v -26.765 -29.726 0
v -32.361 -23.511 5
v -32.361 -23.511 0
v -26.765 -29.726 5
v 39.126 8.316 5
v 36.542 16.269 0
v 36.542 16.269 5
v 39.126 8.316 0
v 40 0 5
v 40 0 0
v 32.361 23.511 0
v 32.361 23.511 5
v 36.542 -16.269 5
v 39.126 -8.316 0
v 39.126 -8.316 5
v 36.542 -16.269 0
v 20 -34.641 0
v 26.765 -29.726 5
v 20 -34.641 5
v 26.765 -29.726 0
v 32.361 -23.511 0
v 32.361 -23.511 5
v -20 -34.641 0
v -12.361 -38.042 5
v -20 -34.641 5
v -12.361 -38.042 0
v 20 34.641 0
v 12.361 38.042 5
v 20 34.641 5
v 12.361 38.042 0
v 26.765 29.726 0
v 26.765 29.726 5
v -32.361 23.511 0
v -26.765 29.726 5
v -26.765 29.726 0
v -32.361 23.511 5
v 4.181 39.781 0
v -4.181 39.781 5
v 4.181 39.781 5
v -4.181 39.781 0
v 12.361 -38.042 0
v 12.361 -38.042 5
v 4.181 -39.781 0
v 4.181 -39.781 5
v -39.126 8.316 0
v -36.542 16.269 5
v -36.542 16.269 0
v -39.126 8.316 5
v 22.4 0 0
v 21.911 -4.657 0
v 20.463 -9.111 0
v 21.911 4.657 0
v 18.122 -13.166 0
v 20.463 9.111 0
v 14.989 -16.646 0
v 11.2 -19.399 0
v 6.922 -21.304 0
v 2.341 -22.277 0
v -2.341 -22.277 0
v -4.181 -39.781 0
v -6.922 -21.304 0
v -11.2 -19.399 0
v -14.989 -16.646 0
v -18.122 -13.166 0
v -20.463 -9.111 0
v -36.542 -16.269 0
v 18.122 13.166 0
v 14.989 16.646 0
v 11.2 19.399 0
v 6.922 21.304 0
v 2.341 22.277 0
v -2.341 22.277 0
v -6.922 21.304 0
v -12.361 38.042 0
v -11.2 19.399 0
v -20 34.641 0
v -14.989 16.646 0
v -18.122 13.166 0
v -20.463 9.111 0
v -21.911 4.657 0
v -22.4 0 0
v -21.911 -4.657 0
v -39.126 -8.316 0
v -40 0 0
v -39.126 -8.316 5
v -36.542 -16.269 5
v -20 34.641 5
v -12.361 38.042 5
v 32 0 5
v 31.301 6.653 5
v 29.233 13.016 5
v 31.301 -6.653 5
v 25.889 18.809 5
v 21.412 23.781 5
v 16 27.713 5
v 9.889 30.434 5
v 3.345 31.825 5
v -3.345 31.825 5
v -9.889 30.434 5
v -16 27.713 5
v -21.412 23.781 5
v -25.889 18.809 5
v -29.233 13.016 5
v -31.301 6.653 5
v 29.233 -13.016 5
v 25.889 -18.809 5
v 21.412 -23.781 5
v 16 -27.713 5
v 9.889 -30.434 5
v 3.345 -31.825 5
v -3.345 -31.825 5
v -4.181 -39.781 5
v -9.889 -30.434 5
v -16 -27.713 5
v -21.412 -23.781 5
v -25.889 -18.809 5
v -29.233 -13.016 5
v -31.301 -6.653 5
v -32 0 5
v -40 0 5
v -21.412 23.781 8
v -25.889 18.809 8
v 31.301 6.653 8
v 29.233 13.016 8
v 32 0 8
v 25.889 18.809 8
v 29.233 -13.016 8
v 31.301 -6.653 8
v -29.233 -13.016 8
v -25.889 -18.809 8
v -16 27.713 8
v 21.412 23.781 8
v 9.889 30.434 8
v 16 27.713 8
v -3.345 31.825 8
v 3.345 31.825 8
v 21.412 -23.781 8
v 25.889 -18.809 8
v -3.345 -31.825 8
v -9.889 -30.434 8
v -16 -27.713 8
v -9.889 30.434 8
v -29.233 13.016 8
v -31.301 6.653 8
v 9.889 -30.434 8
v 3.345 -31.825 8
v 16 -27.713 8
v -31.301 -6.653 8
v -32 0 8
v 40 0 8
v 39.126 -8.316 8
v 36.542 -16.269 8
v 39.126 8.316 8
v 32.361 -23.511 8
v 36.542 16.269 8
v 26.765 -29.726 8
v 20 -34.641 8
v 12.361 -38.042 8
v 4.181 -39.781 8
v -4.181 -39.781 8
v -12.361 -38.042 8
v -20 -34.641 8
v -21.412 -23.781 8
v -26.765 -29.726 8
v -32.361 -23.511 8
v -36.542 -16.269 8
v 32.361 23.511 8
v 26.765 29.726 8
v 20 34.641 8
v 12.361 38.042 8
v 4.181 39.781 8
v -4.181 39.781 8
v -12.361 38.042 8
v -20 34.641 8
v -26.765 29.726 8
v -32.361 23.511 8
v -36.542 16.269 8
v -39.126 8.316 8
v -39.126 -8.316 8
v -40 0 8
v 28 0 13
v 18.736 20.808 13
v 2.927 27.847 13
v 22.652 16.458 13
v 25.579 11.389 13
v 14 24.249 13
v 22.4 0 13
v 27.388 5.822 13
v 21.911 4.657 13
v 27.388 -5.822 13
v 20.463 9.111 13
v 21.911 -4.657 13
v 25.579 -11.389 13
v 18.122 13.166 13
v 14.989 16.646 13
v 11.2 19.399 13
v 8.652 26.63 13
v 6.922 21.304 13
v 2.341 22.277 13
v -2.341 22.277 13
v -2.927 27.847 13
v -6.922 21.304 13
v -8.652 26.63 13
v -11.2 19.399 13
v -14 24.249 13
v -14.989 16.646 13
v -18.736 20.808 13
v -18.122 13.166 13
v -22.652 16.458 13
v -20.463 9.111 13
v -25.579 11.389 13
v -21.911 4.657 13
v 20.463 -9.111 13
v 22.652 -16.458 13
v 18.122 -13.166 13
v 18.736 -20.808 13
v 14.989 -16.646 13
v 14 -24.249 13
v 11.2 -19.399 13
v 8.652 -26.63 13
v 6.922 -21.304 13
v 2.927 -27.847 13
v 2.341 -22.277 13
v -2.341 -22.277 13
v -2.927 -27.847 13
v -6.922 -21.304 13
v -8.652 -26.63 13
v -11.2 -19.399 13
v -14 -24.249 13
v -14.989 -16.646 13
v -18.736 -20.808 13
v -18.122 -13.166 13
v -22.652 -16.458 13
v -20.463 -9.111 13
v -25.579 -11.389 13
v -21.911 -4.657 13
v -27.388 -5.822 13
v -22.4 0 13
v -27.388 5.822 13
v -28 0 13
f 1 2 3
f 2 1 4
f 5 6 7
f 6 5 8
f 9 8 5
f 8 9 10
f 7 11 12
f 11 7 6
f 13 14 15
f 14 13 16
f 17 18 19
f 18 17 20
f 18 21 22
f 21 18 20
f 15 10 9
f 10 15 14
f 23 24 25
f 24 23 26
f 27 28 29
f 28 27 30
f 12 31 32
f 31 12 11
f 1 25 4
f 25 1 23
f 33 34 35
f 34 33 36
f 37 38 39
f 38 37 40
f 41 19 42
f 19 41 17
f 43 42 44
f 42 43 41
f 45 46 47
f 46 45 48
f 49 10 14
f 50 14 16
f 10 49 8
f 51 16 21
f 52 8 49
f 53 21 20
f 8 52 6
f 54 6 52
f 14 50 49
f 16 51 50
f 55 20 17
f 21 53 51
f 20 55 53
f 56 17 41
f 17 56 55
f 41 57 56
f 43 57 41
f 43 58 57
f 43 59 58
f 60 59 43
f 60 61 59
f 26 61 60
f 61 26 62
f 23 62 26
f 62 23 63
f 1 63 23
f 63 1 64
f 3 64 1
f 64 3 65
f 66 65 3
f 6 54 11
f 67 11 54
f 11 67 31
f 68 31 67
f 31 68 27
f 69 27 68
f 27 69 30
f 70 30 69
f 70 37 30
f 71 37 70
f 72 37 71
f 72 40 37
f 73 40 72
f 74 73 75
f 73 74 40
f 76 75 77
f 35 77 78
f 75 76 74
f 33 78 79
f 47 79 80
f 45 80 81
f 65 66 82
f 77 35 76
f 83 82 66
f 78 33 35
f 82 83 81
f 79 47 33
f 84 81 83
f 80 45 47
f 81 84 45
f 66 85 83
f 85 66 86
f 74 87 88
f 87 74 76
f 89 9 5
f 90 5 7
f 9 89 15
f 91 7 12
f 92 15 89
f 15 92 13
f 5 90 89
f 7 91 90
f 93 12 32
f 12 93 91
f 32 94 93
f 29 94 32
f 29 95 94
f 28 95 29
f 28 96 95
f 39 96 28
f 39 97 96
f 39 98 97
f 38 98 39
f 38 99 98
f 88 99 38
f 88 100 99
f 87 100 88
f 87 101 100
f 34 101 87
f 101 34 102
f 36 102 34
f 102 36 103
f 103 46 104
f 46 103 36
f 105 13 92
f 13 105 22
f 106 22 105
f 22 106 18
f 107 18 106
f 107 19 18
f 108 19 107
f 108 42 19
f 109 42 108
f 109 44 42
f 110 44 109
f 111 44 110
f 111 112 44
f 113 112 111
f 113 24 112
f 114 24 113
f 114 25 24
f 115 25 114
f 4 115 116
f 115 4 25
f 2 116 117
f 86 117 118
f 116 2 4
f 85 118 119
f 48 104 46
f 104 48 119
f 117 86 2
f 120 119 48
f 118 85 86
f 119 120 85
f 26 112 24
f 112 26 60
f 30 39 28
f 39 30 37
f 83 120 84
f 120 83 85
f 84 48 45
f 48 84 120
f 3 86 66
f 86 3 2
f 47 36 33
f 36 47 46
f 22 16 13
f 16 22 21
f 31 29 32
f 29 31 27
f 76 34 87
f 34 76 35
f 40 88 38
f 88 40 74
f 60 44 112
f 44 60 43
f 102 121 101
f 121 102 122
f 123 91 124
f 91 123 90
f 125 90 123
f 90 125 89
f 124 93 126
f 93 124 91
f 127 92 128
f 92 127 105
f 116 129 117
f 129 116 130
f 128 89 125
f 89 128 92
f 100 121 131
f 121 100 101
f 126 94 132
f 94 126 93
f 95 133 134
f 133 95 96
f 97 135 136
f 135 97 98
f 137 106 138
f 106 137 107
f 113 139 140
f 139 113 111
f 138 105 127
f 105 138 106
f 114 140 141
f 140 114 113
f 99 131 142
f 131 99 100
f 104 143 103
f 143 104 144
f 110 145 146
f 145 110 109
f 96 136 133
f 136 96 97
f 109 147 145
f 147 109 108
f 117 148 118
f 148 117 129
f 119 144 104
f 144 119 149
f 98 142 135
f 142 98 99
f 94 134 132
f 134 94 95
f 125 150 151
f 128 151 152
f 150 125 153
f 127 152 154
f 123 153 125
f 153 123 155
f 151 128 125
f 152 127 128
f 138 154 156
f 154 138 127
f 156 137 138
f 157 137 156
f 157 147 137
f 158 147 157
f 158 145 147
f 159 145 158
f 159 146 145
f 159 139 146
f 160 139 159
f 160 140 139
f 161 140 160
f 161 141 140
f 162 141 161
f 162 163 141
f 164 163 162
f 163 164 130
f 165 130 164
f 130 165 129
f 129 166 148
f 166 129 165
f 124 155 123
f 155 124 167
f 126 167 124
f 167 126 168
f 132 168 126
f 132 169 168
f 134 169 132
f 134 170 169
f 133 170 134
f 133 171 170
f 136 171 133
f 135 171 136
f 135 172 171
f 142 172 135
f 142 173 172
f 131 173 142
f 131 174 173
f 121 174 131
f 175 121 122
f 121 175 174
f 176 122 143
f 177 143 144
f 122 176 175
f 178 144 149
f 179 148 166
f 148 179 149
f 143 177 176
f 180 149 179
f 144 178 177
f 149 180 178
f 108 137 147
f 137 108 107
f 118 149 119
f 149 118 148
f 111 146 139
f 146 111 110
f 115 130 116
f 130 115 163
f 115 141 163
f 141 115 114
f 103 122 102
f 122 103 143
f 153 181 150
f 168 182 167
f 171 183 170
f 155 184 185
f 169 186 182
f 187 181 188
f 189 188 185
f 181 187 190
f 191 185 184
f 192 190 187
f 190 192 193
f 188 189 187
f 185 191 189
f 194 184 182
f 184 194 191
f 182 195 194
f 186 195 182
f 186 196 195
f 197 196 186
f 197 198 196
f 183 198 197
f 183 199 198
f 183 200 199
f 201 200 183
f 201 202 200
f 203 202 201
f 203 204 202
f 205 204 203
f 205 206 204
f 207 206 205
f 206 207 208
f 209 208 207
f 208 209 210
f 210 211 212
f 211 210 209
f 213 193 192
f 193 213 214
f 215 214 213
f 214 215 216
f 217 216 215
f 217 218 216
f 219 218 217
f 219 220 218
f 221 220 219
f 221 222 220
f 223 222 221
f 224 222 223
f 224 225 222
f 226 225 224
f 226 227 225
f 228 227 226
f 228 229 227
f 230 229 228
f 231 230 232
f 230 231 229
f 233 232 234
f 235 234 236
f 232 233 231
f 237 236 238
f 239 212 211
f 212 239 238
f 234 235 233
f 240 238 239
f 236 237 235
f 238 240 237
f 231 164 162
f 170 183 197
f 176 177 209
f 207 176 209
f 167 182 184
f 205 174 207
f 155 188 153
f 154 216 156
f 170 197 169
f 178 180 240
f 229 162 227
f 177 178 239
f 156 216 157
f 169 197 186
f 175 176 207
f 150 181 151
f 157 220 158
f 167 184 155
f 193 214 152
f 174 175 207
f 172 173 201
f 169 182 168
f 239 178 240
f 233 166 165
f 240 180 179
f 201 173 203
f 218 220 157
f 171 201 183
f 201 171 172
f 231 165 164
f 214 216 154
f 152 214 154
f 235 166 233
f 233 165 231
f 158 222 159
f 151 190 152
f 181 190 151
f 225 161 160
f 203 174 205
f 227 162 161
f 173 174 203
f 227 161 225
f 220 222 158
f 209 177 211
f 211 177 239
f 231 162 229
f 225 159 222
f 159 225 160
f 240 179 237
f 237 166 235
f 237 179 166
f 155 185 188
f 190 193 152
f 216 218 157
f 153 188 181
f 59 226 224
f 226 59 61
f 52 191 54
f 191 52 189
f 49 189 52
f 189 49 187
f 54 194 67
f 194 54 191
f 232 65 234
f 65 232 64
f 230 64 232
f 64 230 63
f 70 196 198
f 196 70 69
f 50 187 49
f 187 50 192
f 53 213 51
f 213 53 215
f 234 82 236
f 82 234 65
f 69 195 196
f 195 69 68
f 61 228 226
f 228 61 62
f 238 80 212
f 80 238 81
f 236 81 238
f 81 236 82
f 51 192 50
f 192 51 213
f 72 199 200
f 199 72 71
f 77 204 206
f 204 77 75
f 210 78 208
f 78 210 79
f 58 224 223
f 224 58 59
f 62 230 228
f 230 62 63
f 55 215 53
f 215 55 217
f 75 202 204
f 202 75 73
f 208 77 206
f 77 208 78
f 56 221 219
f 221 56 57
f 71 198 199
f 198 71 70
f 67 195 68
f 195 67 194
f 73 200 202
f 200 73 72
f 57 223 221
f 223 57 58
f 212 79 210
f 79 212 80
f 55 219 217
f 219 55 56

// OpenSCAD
//CUSTOMIZER VARIABLES

top_height=5; // [0:30]
groove_height=3; // [0:30]
top_width=40; // [0:100]
mid_width=32; // [0:100]

//CUSTOMIZER VARIABLES END

grommet_cap(top_height,mid_width,top_width,groove_height);

module top(h=5,r=10) {
  cylinder(h,r,r);
}

module bottom(h=5,r=10) {
  cylinder(h,r,.7*r);
}

module mid(h=3,r=7) {
  cylinder(h,r,r);
}

module solid(h=5,r1=10,r2=15,g=3) {
  union() {
    top(h,r2);
    translate([0,0,h]) mid(g,r1);
    translate([0,0,h+g]) bottom(h,r2);
  }
}

module grommet_cap(h,r1,r2,g) {
  difference() {
    solid(h,r1,r2,g);
    translate([0,0,-1]) cylinder(2*(h+g),.7*r1,.7*r1);
  }
}
